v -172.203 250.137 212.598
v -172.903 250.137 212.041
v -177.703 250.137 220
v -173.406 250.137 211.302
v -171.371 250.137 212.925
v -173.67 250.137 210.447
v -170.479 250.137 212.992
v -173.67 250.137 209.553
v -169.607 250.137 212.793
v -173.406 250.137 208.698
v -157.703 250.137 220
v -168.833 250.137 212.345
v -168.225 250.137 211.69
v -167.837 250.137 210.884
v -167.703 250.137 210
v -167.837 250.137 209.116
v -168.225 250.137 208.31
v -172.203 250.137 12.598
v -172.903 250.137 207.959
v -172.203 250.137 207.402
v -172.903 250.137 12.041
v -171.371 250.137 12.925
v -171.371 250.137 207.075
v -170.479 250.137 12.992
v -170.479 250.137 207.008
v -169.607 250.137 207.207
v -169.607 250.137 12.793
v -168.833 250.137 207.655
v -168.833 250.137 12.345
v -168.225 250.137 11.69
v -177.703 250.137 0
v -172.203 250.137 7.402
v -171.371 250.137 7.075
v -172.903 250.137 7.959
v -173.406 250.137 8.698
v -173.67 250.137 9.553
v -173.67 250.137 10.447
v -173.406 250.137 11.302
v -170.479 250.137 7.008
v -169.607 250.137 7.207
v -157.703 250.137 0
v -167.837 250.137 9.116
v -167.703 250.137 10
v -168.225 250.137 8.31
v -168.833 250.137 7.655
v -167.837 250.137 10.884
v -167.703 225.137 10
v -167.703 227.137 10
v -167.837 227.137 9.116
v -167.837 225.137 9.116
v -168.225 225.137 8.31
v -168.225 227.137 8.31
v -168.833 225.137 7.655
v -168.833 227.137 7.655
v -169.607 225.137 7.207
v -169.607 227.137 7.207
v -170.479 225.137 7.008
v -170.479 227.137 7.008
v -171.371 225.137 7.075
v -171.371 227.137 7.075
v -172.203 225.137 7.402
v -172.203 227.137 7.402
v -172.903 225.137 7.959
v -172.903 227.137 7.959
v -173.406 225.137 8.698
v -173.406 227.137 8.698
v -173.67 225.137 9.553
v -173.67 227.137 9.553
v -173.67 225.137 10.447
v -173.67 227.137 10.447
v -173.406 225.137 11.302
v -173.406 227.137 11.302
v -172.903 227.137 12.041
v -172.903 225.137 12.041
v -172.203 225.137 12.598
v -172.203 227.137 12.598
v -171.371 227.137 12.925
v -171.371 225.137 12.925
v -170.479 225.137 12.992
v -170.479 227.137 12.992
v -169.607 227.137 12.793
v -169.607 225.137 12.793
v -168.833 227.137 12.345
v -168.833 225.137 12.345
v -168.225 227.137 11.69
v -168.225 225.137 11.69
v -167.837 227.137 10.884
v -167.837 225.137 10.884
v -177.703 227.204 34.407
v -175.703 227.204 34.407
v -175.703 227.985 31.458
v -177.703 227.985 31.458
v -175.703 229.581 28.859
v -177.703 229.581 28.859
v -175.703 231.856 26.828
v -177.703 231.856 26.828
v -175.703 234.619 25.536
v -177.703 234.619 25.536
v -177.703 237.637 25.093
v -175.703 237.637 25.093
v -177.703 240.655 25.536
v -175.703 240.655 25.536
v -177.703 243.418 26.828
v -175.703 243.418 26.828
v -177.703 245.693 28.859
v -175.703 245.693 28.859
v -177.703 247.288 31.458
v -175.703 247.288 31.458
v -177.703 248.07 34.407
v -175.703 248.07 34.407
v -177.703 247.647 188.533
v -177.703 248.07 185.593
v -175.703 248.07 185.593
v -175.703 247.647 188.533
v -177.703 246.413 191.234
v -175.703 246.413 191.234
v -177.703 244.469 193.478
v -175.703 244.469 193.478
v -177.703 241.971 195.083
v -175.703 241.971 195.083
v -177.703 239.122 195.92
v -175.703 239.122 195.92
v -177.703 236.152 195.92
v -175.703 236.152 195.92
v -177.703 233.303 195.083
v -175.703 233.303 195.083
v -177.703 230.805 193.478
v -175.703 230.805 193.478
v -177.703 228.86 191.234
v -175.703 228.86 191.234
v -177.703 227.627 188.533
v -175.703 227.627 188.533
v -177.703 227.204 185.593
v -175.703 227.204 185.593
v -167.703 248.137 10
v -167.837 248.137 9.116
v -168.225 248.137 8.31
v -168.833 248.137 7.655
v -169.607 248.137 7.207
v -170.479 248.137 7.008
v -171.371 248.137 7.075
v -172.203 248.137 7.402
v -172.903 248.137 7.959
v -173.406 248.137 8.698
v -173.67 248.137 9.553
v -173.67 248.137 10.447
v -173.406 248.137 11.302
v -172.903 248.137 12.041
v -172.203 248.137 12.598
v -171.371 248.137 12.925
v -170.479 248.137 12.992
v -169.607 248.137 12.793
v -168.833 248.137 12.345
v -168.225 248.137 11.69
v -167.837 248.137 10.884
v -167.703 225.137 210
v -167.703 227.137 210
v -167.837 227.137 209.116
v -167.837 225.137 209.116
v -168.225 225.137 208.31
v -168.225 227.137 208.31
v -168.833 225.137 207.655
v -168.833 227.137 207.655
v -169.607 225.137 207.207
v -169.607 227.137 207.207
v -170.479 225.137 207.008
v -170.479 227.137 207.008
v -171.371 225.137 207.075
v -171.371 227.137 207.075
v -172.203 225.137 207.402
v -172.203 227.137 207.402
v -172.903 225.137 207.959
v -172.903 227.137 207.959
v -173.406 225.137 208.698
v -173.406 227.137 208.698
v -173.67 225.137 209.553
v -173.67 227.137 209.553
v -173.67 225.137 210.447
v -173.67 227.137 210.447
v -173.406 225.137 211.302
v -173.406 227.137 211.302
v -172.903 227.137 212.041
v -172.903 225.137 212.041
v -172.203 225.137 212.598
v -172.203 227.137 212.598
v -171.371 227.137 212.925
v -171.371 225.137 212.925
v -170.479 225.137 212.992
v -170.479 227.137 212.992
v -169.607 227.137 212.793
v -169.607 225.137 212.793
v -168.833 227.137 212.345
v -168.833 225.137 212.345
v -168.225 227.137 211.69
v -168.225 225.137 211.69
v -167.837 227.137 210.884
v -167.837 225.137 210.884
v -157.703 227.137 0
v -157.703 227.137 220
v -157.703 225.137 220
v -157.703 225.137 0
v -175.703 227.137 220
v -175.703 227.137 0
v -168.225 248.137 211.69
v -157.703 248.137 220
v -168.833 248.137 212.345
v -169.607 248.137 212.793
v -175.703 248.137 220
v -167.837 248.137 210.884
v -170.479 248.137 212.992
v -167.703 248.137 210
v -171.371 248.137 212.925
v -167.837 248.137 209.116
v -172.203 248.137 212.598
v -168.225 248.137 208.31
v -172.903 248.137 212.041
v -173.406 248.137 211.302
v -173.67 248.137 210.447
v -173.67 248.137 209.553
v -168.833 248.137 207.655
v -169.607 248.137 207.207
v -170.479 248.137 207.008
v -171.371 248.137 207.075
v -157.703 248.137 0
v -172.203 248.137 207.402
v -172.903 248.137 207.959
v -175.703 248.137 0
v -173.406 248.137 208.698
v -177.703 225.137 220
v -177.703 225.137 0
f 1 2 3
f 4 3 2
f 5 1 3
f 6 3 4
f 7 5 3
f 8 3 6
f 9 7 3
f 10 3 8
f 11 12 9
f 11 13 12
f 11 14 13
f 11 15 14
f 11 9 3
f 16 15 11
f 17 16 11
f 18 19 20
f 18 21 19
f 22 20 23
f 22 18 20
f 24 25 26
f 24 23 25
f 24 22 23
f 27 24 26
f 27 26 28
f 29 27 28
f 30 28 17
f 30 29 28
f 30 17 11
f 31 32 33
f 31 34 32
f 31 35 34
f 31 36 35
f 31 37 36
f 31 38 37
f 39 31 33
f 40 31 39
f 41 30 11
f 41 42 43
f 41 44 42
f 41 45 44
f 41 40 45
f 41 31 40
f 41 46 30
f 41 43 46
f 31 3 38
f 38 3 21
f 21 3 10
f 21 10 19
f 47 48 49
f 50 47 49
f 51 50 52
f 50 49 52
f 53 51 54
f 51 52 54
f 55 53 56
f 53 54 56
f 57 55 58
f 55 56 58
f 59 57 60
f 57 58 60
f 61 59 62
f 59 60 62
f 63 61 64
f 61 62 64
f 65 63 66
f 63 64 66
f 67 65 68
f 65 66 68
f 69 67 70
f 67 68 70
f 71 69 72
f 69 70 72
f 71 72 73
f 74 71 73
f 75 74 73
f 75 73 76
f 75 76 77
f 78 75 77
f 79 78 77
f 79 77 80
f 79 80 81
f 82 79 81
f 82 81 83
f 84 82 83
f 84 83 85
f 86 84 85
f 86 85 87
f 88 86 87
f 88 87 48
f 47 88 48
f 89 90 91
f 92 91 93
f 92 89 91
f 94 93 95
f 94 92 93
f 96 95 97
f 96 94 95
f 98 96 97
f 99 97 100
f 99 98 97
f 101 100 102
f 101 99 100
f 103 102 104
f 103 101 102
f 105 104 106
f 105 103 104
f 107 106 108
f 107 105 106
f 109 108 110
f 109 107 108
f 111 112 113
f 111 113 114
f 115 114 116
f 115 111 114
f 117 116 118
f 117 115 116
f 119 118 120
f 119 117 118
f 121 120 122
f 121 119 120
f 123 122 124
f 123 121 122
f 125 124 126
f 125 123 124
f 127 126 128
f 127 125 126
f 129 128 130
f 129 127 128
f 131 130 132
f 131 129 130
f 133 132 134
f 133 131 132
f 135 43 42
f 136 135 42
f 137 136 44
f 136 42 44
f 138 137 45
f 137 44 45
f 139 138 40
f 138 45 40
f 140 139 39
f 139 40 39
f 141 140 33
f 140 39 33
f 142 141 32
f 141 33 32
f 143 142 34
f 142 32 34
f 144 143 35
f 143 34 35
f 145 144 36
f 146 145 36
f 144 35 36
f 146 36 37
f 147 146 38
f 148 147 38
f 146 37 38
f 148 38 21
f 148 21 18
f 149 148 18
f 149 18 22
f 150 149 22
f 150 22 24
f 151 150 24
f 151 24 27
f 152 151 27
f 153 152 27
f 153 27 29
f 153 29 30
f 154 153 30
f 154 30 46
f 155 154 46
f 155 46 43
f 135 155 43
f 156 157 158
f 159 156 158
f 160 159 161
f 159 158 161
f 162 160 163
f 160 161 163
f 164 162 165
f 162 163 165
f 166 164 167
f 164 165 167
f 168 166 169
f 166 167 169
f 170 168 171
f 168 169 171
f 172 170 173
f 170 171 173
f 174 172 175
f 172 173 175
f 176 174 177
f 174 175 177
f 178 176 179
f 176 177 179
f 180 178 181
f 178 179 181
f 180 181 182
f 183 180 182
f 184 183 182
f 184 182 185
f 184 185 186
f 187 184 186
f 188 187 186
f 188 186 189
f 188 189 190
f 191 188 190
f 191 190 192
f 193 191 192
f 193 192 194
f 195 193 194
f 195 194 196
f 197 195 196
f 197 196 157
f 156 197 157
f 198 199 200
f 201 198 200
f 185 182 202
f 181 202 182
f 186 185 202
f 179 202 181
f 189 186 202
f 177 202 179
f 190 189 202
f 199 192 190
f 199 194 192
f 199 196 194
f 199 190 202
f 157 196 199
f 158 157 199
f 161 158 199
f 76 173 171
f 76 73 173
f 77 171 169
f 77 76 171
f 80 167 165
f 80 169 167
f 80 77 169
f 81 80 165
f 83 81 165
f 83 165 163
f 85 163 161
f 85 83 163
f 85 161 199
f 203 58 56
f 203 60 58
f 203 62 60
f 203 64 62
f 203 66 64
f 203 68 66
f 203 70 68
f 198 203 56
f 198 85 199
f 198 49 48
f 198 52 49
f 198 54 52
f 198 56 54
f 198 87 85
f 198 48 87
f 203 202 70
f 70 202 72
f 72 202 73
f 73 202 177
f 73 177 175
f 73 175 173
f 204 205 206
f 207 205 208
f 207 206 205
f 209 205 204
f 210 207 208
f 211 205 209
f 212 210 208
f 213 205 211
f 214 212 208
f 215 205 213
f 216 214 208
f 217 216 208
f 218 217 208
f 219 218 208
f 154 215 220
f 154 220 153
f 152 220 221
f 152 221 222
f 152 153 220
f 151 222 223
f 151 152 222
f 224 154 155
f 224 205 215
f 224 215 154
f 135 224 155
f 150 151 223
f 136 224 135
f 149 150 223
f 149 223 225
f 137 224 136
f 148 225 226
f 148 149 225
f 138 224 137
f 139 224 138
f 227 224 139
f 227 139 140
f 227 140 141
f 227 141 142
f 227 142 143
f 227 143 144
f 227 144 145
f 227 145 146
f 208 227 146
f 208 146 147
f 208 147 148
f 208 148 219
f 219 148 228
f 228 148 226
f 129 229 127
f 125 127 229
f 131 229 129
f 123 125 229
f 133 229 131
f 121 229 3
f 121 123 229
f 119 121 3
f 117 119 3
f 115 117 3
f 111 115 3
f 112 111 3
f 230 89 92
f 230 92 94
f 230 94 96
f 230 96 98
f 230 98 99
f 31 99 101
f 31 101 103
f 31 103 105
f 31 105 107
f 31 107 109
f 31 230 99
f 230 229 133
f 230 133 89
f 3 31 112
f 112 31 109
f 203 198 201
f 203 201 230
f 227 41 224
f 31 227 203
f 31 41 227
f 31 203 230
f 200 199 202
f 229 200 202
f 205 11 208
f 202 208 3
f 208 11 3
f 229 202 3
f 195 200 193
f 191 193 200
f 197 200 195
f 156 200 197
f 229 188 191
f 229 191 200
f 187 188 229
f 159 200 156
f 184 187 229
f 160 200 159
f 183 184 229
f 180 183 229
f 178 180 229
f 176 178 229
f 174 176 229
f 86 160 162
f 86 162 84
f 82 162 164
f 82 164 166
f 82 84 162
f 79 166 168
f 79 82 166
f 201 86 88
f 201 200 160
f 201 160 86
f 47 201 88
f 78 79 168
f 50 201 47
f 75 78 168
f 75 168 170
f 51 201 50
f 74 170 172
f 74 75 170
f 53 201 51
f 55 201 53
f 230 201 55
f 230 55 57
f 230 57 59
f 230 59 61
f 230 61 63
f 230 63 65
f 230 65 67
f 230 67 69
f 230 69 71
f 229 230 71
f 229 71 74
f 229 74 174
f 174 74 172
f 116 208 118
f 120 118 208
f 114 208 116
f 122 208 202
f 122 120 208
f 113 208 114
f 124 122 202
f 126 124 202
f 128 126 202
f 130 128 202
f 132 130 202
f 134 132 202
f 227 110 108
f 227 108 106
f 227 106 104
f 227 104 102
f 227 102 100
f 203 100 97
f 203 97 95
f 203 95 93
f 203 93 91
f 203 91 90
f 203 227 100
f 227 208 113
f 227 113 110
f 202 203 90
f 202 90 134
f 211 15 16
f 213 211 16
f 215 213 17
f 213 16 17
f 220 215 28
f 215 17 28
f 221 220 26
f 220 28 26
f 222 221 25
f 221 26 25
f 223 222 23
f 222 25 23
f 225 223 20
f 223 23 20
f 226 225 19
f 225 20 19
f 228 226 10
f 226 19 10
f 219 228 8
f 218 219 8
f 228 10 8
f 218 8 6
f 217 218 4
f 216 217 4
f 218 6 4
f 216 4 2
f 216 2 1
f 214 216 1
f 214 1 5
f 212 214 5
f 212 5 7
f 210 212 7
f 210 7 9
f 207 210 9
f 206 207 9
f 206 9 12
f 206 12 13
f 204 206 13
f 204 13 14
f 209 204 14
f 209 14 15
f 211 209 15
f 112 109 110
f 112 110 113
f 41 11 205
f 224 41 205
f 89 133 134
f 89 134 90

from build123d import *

# Parameters (mm, degrees)
BOSS_EXTRUDE1_DEPTH = 220
CUT_EXTRUDE1_REACH  = 22
SKETCH3_R           = 3
CUT_EXTRUDE2_DEPTH  = 220


with BuildPart() as part:
    # Sketch1 → Boss-Extrude1 (new body)
    with BuildSketch(Plane.XY):
        Polygon((-157.703422053, 227.136882129), (-157.703422053, 225.136882129), (-177.703422053, 225.136882129), (-177.703422053, 250.136882129), (-157.703422053, 250.136882129), (-157.703422053, 248.136882129), (-175.703422053, 248.136882129), (-175.703422053, 227.136882129), align=None)
    extrude(amount=BOSS_EXTRUDE1_DEPTH)

    # Sketch2 → Cut-Extrude1 (cut, up to next)
    with BuildSketch(Plane.ZY.offset(177.703422053), mode=Mode.PRIVATE) as cut_extrude1_sk1:
        with BuildLine():
            Line((34.406705906, 248.069619472), (185.593294094, 248.069619472))
            ThreePointArc((185.593294094, 248.069619472), (196.026031437, 237.636882129), (185.593294094, 227.204144786))
            Line((185.593294094, 227.204144786), (34.406705906, 227.204144786))
            ThreePointArc((34.406705906, 227.204144786), (25.093294094, 237.636882129), (34.406705906, 248.069619472))
        make_face()
    cut_extrude1_tool1 = extrude(cut_extrude1_sk1.sketch, amount=-CUT_EXTRUDE1_REACH, mode=Mode.PRIVATE) & part.part
    add(cut_extrude1_tool1.solids().sort_by_distance((-177.703422, 237.636882, 110.543615))[0], mode=Mode.SUBTRACT)

    # Sketch3 → Cut-Extrude2 (cut)
    with BuildSketch(Plane(origin=(0, 250.136882129, 0), x_dir=(1, 0, 0), z_dir=(0, 1, 0))):
        with Locations((-170.703422053, -210)):
            Circle(SKETCH3_R)
        with Locations((-170.703422053, -10)):
            Circle(SKETCH3_R)
    extrude(amount=-CUT_EXTRUDE2_DEPTH, mode=Mode.SUBTRACT)


solid = part.part
